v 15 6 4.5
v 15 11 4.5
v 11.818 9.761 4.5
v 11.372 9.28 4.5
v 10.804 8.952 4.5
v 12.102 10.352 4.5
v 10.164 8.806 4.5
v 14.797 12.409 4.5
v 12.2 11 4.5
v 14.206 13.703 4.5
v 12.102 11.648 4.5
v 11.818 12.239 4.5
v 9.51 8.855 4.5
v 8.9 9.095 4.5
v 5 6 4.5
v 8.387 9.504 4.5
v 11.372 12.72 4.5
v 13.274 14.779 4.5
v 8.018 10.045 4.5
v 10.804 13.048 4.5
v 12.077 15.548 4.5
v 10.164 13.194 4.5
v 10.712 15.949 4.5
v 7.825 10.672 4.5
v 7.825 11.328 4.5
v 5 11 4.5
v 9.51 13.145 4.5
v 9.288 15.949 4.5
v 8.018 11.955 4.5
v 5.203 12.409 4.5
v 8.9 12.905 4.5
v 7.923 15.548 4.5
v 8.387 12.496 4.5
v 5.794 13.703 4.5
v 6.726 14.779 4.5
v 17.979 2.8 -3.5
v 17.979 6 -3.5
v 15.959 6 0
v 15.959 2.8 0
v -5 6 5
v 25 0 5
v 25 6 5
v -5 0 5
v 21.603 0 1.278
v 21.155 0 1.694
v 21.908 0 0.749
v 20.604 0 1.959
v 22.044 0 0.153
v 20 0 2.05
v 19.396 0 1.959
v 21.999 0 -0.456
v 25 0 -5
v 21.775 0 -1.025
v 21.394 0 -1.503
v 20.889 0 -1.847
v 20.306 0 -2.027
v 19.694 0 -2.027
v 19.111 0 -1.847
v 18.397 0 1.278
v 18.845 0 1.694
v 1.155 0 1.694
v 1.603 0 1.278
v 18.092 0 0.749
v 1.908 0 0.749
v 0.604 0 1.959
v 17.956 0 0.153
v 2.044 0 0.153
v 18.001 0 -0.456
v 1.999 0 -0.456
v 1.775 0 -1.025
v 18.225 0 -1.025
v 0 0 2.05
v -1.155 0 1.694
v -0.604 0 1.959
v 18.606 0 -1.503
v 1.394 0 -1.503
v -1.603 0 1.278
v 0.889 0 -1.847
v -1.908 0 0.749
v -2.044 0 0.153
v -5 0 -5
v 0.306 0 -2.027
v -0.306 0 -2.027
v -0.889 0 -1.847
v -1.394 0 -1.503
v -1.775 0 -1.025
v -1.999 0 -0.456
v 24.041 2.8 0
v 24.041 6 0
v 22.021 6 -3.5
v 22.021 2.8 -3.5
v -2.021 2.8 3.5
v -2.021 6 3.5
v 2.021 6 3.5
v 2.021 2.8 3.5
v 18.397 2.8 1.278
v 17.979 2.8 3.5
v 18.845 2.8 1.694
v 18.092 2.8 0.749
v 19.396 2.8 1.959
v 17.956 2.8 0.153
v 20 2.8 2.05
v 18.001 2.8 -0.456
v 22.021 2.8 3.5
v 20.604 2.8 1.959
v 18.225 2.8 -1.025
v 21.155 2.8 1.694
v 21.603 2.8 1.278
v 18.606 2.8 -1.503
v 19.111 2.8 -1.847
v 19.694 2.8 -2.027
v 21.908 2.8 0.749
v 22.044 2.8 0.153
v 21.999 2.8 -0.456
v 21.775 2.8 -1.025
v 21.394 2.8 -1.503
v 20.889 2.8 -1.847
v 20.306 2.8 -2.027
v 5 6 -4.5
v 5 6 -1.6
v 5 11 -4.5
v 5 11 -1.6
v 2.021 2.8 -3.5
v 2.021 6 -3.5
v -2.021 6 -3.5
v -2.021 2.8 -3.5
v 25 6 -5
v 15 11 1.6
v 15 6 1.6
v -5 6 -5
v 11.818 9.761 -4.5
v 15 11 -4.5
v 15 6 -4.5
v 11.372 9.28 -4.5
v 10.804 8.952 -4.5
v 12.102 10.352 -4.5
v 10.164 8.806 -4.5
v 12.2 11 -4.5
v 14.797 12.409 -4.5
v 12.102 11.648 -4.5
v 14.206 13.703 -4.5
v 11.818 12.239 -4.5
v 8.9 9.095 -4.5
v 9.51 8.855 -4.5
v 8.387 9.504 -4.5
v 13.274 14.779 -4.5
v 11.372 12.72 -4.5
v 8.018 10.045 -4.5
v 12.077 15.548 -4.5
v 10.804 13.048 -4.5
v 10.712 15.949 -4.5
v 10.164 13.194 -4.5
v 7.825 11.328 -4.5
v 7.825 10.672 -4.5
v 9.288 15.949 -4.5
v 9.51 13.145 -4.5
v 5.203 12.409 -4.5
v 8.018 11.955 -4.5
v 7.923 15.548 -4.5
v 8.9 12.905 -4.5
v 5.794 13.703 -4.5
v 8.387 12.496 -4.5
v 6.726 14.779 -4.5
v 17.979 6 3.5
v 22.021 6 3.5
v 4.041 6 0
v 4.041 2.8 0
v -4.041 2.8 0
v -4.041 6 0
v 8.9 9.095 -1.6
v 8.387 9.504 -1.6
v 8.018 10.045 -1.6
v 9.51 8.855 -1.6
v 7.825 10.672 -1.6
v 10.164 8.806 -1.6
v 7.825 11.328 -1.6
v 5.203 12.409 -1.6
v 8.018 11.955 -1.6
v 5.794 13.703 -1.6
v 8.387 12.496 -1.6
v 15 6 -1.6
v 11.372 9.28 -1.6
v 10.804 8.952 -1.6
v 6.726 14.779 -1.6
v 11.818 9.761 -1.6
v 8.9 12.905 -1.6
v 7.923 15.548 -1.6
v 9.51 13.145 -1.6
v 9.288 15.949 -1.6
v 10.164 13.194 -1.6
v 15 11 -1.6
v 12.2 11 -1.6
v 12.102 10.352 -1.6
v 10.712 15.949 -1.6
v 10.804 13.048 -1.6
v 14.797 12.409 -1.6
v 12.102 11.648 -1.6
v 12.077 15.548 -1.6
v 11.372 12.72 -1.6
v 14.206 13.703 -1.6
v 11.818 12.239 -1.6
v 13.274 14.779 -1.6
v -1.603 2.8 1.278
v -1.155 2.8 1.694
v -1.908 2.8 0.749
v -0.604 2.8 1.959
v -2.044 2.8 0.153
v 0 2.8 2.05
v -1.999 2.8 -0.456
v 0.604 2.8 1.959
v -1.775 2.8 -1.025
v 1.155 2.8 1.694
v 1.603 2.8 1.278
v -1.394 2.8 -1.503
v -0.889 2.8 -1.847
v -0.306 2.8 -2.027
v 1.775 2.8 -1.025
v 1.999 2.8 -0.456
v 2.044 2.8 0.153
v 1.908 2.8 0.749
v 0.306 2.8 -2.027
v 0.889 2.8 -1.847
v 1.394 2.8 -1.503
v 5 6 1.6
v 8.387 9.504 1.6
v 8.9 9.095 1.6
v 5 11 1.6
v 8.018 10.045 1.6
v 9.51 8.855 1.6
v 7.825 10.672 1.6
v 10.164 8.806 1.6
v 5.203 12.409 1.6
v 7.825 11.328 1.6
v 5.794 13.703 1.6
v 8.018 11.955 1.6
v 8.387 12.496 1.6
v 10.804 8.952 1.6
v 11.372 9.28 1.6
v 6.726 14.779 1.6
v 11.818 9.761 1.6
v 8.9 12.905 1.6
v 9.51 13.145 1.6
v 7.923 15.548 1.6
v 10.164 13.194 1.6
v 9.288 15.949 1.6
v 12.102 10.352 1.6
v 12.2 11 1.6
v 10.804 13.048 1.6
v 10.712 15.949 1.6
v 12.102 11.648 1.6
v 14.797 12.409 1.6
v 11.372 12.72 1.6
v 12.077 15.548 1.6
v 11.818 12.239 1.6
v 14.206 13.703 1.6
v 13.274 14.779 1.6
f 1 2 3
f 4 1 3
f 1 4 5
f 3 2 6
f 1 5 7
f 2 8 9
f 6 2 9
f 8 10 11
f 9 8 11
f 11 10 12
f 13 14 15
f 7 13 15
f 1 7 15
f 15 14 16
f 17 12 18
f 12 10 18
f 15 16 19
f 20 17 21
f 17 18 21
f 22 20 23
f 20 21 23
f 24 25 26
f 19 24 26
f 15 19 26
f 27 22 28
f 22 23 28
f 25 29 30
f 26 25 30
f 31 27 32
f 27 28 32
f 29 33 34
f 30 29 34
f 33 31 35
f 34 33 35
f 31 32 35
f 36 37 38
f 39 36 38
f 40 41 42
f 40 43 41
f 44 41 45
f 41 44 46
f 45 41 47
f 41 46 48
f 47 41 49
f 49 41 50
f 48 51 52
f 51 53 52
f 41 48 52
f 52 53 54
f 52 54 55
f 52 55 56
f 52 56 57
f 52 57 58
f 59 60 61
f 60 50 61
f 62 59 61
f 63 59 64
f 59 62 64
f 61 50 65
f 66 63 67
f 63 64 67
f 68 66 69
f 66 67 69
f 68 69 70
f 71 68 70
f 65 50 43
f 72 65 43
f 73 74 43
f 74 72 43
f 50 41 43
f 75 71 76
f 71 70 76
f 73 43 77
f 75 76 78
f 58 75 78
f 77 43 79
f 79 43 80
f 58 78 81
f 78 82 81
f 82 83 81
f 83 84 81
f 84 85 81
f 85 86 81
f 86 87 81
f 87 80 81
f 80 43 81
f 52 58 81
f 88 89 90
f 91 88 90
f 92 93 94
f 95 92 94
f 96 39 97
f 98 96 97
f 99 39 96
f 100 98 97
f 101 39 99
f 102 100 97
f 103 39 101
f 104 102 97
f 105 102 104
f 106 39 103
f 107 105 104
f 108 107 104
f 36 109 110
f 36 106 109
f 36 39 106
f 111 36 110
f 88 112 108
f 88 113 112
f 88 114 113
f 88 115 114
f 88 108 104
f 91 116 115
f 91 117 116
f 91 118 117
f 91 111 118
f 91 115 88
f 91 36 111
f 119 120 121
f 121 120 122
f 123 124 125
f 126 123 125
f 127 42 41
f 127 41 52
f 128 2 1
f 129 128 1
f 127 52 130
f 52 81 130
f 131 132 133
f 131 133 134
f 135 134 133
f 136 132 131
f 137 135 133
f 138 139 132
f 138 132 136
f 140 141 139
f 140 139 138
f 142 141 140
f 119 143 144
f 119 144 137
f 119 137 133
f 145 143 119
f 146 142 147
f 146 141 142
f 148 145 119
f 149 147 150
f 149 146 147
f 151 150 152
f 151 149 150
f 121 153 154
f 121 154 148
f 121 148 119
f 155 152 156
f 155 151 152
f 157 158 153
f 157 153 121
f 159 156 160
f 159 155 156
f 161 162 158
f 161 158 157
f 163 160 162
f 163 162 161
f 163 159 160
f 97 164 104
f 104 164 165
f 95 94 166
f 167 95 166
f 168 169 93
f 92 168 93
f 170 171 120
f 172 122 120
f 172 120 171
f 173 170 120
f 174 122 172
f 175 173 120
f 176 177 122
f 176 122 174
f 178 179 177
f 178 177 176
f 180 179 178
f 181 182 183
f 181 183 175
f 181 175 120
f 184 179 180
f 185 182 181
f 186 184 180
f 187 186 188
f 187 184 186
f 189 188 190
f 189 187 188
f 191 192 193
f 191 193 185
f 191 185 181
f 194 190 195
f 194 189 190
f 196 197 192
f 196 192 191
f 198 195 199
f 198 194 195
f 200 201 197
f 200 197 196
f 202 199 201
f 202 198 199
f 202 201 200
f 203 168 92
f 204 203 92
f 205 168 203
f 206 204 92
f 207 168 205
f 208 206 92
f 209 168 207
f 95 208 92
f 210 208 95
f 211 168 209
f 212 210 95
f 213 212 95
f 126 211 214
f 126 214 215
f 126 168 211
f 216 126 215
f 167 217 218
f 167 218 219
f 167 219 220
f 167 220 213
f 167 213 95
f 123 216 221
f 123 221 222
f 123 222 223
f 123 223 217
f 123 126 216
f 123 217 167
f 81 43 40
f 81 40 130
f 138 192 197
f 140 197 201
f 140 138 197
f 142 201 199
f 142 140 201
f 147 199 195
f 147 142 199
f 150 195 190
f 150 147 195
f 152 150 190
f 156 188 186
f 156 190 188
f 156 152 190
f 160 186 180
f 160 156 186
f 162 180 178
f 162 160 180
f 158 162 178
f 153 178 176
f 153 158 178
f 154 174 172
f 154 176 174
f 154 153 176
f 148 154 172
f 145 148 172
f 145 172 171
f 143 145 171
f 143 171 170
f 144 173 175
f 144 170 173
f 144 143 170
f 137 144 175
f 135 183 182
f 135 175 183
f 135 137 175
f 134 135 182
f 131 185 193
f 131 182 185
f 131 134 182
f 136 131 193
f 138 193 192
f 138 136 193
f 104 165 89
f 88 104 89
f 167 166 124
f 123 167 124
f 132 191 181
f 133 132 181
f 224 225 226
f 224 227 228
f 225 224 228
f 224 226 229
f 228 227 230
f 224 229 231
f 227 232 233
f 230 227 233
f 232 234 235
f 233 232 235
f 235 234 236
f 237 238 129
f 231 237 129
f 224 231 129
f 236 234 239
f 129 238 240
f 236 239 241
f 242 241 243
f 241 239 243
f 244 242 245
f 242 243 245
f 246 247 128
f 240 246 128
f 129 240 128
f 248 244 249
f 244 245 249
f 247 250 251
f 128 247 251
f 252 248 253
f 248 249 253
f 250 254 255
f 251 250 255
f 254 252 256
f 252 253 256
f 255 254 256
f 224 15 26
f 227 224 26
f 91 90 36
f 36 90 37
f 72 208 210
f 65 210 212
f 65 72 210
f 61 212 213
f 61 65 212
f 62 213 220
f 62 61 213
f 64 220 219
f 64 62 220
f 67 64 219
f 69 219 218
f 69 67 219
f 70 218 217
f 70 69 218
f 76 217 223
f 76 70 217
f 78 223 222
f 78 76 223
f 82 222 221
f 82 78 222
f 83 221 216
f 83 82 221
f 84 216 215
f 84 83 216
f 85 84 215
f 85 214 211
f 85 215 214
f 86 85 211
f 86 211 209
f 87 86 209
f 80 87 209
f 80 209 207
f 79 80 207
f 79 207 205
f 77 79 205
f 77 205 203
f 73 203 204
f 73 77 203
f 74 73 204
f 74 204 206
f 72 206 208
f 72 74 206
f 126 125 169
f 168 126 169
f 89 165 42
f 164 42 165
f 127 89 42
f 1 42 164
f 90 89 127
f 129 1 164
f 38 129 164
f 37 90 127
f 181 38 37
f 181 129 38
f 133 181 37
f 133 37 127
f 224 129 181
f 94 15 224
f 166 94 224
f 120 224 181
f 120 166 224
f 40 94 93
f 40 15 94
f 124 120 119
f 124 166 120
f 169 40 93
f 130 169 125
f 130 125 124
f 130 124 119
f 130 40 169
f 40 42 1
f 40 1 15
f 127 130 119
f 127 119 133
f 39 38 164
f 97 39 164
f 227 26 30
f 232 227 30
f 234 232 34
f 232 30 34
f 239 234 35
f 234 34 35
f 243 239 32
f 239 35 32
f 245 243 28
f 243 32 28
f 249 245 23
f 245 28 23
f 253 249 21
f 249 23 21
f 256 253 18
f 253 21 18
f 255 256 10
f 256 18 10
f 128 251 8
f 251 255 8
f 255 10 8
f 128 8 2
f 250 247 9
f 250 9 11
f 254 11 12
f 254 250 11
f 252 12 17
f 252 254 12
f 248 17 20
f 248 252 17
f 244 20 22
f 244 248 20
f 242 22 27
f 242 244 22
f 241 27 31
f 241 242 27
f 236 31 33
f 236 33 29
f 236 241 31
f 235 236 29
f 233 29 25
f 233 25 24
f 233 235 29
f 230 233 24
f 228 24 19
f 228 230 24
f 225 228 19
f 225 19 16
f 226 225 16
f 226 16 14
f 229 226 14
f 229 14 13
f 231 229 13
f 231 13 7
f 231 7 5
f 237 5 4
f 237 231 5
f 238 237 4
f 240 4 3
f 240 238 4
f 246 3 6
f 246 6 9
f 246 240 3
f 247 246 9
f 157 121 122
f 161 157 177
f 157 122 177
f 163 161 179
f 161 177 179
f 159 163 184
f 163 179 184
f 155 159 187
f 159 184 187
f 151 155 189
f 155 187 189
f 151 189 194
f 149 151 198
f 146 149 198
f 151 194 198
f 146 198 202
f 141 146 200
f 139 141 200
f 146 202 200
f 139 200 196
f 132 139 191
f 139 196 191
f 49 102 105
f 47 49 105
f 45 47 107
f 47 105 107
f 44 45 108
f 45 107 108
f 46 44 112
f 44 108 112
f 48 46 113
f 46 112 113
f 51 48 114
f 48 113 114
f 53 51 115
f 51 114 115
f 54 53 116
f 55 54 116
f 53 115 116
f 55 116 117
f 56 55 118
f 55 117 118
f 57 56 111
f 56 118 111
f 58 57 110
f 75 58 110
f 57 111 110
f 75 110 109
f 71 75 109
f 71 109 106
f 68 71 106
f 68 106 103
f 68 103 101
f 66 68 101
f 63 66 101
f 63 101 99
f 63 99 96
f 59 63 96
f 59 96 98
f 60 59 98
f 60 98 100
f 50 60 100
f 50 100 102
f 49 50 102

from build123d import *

# Parameters (mm, degrees)
SKETCH1_W           = 10
SKETCH1_H           = 10
SKETCH1_R           = 2.05
BOSS_EXTRUDE1_DEPTH = 6
CUT_EXTRUDE1_DEPTH  = 3.2
SKETCH3_W           = 10
SKETCH3_H           = 6
BOSS_EXTRUDE2_DEPTH = 20
SKETCH4_R           = 2.05
CUT_EXTRUDE2_DEPTH  = 27.191601707
CUT_EXTRUDE3_DEPTH  = 3.2
SKETCH8_R           = 2.2
BOSS_EXTRUDE4_DEPTH = 4.5
SKETCH10_W          = 17.254554438
SKETCH10_H          = 12.252832867
CUT_EXTRUDE5_DEPTH  = 1.6


with BuildPart() as part:
    # Sketch1 → Boss-Extrude1 (new body)
    with BuildSketch(Plane(origin=(0, 0, 0), x_dir=(1, 0, 0), z_dir=(0, 1, 0))):
        Rectangle(SKETCH1_W, SKETCH1_H)
        with Locations(Location((0, 0, 0), (0, 0, 270))):
            Circle(SKETCH1_R, mode=Mode.SUBTRACT)
    extrude(amount=BOSS_EXTRUDE1_DEPTH)

    # Sketch2 → Cut-Extrude1 (cut)
    with BuildSketch(Plane(origin=(0, 6, 0), x_dir=(1, 0, 0), z_dir=(0, 1, 0))):
        Polygon((4.041451884, 0), (2.020725942, 3.5), (-2.020725942, 3.5), (-4.041451884, 0), (-2.020725942, -3.5), (2.020725942, -3.5), align=None)
    extrude(amount=-CUT_EXTRUDE1_DEPTH, mode=Mode.SUBTRACT)

    # Sketch3 → Boss-Extrude2 (add)
    with BuildSketch(Plane(origin=(5, 0, 0), x_dir=(0, 0, -1), z_dir=(1, 0, 0))):
        with Locations((0, 3)):
            Rectangle(SKETCH3_W, SKETCH3_H)
    extrude(amount=BOSS_EXTRUDE2_DEPTH)

    # Sketch4 → Cut-Extrude2 (cut, through all)
    with BuildSketch(Plane(origin=(0, 6, 0), x_dir=(1, 0, 0), z_dir=(0, 1, 0))):
        with Locations(Location((20, 0, 0), (0, 0, 270))):
            Circle(SKETCH4_R)
    extrude(amount=-CUT_EXTRUDE2_DEPTH, mode=Mode.SUBTRACT)

    # Sketch5 → Cut-Extrude3 (cut)
    with BuildSketch(Plane(origin=(0, 6, 0), x_dir=(1, 0, 0), z_dir=(0, 1, 0))):
        Polygon((24.041451884, 0), (22.020725942, 3.5), (17.979274058, 3.5), (15.958548116, 0), (17.979274058, -3.5), (22.020725942, -3.5), align=None)
    extrude(amount=-CUT_EXTRUDE3_DEPTH, mode=Mode.SUBTRACT)

    # Sketch8 → Boss-Extrude4 (add, symmetric)
    with BuildSketch(Plane.XY):
        with BuildLine():
            Line((5, 6), (5, 11))
            ThreePointArc((5, 11), (10, 16), (15, 11))
            Line((15, 11), (15, 6))
            Line((15, 6), (5, 6))
        make_face()
        with Locations((10, 11)):
            Circle(SKETCH8_R, mode=Mode.SUBTRACT)
    extrude(amount=BOSS_EXTRUDE4_DEPTH, both=True)

    # Sketch10 → Cut-Extrude5 (cut, symmetric)
    with BuildSketch(Plane.XY):
        with Locations((11.441920225, 12.126416434)):
            Rectangle(SKETCH10_W, SKETCH10_H)
    extrude(amount=CUT_EXTRUDE5_DEPTH, both=True, mode=Mode.SUBTRACT)


solid = part.part
